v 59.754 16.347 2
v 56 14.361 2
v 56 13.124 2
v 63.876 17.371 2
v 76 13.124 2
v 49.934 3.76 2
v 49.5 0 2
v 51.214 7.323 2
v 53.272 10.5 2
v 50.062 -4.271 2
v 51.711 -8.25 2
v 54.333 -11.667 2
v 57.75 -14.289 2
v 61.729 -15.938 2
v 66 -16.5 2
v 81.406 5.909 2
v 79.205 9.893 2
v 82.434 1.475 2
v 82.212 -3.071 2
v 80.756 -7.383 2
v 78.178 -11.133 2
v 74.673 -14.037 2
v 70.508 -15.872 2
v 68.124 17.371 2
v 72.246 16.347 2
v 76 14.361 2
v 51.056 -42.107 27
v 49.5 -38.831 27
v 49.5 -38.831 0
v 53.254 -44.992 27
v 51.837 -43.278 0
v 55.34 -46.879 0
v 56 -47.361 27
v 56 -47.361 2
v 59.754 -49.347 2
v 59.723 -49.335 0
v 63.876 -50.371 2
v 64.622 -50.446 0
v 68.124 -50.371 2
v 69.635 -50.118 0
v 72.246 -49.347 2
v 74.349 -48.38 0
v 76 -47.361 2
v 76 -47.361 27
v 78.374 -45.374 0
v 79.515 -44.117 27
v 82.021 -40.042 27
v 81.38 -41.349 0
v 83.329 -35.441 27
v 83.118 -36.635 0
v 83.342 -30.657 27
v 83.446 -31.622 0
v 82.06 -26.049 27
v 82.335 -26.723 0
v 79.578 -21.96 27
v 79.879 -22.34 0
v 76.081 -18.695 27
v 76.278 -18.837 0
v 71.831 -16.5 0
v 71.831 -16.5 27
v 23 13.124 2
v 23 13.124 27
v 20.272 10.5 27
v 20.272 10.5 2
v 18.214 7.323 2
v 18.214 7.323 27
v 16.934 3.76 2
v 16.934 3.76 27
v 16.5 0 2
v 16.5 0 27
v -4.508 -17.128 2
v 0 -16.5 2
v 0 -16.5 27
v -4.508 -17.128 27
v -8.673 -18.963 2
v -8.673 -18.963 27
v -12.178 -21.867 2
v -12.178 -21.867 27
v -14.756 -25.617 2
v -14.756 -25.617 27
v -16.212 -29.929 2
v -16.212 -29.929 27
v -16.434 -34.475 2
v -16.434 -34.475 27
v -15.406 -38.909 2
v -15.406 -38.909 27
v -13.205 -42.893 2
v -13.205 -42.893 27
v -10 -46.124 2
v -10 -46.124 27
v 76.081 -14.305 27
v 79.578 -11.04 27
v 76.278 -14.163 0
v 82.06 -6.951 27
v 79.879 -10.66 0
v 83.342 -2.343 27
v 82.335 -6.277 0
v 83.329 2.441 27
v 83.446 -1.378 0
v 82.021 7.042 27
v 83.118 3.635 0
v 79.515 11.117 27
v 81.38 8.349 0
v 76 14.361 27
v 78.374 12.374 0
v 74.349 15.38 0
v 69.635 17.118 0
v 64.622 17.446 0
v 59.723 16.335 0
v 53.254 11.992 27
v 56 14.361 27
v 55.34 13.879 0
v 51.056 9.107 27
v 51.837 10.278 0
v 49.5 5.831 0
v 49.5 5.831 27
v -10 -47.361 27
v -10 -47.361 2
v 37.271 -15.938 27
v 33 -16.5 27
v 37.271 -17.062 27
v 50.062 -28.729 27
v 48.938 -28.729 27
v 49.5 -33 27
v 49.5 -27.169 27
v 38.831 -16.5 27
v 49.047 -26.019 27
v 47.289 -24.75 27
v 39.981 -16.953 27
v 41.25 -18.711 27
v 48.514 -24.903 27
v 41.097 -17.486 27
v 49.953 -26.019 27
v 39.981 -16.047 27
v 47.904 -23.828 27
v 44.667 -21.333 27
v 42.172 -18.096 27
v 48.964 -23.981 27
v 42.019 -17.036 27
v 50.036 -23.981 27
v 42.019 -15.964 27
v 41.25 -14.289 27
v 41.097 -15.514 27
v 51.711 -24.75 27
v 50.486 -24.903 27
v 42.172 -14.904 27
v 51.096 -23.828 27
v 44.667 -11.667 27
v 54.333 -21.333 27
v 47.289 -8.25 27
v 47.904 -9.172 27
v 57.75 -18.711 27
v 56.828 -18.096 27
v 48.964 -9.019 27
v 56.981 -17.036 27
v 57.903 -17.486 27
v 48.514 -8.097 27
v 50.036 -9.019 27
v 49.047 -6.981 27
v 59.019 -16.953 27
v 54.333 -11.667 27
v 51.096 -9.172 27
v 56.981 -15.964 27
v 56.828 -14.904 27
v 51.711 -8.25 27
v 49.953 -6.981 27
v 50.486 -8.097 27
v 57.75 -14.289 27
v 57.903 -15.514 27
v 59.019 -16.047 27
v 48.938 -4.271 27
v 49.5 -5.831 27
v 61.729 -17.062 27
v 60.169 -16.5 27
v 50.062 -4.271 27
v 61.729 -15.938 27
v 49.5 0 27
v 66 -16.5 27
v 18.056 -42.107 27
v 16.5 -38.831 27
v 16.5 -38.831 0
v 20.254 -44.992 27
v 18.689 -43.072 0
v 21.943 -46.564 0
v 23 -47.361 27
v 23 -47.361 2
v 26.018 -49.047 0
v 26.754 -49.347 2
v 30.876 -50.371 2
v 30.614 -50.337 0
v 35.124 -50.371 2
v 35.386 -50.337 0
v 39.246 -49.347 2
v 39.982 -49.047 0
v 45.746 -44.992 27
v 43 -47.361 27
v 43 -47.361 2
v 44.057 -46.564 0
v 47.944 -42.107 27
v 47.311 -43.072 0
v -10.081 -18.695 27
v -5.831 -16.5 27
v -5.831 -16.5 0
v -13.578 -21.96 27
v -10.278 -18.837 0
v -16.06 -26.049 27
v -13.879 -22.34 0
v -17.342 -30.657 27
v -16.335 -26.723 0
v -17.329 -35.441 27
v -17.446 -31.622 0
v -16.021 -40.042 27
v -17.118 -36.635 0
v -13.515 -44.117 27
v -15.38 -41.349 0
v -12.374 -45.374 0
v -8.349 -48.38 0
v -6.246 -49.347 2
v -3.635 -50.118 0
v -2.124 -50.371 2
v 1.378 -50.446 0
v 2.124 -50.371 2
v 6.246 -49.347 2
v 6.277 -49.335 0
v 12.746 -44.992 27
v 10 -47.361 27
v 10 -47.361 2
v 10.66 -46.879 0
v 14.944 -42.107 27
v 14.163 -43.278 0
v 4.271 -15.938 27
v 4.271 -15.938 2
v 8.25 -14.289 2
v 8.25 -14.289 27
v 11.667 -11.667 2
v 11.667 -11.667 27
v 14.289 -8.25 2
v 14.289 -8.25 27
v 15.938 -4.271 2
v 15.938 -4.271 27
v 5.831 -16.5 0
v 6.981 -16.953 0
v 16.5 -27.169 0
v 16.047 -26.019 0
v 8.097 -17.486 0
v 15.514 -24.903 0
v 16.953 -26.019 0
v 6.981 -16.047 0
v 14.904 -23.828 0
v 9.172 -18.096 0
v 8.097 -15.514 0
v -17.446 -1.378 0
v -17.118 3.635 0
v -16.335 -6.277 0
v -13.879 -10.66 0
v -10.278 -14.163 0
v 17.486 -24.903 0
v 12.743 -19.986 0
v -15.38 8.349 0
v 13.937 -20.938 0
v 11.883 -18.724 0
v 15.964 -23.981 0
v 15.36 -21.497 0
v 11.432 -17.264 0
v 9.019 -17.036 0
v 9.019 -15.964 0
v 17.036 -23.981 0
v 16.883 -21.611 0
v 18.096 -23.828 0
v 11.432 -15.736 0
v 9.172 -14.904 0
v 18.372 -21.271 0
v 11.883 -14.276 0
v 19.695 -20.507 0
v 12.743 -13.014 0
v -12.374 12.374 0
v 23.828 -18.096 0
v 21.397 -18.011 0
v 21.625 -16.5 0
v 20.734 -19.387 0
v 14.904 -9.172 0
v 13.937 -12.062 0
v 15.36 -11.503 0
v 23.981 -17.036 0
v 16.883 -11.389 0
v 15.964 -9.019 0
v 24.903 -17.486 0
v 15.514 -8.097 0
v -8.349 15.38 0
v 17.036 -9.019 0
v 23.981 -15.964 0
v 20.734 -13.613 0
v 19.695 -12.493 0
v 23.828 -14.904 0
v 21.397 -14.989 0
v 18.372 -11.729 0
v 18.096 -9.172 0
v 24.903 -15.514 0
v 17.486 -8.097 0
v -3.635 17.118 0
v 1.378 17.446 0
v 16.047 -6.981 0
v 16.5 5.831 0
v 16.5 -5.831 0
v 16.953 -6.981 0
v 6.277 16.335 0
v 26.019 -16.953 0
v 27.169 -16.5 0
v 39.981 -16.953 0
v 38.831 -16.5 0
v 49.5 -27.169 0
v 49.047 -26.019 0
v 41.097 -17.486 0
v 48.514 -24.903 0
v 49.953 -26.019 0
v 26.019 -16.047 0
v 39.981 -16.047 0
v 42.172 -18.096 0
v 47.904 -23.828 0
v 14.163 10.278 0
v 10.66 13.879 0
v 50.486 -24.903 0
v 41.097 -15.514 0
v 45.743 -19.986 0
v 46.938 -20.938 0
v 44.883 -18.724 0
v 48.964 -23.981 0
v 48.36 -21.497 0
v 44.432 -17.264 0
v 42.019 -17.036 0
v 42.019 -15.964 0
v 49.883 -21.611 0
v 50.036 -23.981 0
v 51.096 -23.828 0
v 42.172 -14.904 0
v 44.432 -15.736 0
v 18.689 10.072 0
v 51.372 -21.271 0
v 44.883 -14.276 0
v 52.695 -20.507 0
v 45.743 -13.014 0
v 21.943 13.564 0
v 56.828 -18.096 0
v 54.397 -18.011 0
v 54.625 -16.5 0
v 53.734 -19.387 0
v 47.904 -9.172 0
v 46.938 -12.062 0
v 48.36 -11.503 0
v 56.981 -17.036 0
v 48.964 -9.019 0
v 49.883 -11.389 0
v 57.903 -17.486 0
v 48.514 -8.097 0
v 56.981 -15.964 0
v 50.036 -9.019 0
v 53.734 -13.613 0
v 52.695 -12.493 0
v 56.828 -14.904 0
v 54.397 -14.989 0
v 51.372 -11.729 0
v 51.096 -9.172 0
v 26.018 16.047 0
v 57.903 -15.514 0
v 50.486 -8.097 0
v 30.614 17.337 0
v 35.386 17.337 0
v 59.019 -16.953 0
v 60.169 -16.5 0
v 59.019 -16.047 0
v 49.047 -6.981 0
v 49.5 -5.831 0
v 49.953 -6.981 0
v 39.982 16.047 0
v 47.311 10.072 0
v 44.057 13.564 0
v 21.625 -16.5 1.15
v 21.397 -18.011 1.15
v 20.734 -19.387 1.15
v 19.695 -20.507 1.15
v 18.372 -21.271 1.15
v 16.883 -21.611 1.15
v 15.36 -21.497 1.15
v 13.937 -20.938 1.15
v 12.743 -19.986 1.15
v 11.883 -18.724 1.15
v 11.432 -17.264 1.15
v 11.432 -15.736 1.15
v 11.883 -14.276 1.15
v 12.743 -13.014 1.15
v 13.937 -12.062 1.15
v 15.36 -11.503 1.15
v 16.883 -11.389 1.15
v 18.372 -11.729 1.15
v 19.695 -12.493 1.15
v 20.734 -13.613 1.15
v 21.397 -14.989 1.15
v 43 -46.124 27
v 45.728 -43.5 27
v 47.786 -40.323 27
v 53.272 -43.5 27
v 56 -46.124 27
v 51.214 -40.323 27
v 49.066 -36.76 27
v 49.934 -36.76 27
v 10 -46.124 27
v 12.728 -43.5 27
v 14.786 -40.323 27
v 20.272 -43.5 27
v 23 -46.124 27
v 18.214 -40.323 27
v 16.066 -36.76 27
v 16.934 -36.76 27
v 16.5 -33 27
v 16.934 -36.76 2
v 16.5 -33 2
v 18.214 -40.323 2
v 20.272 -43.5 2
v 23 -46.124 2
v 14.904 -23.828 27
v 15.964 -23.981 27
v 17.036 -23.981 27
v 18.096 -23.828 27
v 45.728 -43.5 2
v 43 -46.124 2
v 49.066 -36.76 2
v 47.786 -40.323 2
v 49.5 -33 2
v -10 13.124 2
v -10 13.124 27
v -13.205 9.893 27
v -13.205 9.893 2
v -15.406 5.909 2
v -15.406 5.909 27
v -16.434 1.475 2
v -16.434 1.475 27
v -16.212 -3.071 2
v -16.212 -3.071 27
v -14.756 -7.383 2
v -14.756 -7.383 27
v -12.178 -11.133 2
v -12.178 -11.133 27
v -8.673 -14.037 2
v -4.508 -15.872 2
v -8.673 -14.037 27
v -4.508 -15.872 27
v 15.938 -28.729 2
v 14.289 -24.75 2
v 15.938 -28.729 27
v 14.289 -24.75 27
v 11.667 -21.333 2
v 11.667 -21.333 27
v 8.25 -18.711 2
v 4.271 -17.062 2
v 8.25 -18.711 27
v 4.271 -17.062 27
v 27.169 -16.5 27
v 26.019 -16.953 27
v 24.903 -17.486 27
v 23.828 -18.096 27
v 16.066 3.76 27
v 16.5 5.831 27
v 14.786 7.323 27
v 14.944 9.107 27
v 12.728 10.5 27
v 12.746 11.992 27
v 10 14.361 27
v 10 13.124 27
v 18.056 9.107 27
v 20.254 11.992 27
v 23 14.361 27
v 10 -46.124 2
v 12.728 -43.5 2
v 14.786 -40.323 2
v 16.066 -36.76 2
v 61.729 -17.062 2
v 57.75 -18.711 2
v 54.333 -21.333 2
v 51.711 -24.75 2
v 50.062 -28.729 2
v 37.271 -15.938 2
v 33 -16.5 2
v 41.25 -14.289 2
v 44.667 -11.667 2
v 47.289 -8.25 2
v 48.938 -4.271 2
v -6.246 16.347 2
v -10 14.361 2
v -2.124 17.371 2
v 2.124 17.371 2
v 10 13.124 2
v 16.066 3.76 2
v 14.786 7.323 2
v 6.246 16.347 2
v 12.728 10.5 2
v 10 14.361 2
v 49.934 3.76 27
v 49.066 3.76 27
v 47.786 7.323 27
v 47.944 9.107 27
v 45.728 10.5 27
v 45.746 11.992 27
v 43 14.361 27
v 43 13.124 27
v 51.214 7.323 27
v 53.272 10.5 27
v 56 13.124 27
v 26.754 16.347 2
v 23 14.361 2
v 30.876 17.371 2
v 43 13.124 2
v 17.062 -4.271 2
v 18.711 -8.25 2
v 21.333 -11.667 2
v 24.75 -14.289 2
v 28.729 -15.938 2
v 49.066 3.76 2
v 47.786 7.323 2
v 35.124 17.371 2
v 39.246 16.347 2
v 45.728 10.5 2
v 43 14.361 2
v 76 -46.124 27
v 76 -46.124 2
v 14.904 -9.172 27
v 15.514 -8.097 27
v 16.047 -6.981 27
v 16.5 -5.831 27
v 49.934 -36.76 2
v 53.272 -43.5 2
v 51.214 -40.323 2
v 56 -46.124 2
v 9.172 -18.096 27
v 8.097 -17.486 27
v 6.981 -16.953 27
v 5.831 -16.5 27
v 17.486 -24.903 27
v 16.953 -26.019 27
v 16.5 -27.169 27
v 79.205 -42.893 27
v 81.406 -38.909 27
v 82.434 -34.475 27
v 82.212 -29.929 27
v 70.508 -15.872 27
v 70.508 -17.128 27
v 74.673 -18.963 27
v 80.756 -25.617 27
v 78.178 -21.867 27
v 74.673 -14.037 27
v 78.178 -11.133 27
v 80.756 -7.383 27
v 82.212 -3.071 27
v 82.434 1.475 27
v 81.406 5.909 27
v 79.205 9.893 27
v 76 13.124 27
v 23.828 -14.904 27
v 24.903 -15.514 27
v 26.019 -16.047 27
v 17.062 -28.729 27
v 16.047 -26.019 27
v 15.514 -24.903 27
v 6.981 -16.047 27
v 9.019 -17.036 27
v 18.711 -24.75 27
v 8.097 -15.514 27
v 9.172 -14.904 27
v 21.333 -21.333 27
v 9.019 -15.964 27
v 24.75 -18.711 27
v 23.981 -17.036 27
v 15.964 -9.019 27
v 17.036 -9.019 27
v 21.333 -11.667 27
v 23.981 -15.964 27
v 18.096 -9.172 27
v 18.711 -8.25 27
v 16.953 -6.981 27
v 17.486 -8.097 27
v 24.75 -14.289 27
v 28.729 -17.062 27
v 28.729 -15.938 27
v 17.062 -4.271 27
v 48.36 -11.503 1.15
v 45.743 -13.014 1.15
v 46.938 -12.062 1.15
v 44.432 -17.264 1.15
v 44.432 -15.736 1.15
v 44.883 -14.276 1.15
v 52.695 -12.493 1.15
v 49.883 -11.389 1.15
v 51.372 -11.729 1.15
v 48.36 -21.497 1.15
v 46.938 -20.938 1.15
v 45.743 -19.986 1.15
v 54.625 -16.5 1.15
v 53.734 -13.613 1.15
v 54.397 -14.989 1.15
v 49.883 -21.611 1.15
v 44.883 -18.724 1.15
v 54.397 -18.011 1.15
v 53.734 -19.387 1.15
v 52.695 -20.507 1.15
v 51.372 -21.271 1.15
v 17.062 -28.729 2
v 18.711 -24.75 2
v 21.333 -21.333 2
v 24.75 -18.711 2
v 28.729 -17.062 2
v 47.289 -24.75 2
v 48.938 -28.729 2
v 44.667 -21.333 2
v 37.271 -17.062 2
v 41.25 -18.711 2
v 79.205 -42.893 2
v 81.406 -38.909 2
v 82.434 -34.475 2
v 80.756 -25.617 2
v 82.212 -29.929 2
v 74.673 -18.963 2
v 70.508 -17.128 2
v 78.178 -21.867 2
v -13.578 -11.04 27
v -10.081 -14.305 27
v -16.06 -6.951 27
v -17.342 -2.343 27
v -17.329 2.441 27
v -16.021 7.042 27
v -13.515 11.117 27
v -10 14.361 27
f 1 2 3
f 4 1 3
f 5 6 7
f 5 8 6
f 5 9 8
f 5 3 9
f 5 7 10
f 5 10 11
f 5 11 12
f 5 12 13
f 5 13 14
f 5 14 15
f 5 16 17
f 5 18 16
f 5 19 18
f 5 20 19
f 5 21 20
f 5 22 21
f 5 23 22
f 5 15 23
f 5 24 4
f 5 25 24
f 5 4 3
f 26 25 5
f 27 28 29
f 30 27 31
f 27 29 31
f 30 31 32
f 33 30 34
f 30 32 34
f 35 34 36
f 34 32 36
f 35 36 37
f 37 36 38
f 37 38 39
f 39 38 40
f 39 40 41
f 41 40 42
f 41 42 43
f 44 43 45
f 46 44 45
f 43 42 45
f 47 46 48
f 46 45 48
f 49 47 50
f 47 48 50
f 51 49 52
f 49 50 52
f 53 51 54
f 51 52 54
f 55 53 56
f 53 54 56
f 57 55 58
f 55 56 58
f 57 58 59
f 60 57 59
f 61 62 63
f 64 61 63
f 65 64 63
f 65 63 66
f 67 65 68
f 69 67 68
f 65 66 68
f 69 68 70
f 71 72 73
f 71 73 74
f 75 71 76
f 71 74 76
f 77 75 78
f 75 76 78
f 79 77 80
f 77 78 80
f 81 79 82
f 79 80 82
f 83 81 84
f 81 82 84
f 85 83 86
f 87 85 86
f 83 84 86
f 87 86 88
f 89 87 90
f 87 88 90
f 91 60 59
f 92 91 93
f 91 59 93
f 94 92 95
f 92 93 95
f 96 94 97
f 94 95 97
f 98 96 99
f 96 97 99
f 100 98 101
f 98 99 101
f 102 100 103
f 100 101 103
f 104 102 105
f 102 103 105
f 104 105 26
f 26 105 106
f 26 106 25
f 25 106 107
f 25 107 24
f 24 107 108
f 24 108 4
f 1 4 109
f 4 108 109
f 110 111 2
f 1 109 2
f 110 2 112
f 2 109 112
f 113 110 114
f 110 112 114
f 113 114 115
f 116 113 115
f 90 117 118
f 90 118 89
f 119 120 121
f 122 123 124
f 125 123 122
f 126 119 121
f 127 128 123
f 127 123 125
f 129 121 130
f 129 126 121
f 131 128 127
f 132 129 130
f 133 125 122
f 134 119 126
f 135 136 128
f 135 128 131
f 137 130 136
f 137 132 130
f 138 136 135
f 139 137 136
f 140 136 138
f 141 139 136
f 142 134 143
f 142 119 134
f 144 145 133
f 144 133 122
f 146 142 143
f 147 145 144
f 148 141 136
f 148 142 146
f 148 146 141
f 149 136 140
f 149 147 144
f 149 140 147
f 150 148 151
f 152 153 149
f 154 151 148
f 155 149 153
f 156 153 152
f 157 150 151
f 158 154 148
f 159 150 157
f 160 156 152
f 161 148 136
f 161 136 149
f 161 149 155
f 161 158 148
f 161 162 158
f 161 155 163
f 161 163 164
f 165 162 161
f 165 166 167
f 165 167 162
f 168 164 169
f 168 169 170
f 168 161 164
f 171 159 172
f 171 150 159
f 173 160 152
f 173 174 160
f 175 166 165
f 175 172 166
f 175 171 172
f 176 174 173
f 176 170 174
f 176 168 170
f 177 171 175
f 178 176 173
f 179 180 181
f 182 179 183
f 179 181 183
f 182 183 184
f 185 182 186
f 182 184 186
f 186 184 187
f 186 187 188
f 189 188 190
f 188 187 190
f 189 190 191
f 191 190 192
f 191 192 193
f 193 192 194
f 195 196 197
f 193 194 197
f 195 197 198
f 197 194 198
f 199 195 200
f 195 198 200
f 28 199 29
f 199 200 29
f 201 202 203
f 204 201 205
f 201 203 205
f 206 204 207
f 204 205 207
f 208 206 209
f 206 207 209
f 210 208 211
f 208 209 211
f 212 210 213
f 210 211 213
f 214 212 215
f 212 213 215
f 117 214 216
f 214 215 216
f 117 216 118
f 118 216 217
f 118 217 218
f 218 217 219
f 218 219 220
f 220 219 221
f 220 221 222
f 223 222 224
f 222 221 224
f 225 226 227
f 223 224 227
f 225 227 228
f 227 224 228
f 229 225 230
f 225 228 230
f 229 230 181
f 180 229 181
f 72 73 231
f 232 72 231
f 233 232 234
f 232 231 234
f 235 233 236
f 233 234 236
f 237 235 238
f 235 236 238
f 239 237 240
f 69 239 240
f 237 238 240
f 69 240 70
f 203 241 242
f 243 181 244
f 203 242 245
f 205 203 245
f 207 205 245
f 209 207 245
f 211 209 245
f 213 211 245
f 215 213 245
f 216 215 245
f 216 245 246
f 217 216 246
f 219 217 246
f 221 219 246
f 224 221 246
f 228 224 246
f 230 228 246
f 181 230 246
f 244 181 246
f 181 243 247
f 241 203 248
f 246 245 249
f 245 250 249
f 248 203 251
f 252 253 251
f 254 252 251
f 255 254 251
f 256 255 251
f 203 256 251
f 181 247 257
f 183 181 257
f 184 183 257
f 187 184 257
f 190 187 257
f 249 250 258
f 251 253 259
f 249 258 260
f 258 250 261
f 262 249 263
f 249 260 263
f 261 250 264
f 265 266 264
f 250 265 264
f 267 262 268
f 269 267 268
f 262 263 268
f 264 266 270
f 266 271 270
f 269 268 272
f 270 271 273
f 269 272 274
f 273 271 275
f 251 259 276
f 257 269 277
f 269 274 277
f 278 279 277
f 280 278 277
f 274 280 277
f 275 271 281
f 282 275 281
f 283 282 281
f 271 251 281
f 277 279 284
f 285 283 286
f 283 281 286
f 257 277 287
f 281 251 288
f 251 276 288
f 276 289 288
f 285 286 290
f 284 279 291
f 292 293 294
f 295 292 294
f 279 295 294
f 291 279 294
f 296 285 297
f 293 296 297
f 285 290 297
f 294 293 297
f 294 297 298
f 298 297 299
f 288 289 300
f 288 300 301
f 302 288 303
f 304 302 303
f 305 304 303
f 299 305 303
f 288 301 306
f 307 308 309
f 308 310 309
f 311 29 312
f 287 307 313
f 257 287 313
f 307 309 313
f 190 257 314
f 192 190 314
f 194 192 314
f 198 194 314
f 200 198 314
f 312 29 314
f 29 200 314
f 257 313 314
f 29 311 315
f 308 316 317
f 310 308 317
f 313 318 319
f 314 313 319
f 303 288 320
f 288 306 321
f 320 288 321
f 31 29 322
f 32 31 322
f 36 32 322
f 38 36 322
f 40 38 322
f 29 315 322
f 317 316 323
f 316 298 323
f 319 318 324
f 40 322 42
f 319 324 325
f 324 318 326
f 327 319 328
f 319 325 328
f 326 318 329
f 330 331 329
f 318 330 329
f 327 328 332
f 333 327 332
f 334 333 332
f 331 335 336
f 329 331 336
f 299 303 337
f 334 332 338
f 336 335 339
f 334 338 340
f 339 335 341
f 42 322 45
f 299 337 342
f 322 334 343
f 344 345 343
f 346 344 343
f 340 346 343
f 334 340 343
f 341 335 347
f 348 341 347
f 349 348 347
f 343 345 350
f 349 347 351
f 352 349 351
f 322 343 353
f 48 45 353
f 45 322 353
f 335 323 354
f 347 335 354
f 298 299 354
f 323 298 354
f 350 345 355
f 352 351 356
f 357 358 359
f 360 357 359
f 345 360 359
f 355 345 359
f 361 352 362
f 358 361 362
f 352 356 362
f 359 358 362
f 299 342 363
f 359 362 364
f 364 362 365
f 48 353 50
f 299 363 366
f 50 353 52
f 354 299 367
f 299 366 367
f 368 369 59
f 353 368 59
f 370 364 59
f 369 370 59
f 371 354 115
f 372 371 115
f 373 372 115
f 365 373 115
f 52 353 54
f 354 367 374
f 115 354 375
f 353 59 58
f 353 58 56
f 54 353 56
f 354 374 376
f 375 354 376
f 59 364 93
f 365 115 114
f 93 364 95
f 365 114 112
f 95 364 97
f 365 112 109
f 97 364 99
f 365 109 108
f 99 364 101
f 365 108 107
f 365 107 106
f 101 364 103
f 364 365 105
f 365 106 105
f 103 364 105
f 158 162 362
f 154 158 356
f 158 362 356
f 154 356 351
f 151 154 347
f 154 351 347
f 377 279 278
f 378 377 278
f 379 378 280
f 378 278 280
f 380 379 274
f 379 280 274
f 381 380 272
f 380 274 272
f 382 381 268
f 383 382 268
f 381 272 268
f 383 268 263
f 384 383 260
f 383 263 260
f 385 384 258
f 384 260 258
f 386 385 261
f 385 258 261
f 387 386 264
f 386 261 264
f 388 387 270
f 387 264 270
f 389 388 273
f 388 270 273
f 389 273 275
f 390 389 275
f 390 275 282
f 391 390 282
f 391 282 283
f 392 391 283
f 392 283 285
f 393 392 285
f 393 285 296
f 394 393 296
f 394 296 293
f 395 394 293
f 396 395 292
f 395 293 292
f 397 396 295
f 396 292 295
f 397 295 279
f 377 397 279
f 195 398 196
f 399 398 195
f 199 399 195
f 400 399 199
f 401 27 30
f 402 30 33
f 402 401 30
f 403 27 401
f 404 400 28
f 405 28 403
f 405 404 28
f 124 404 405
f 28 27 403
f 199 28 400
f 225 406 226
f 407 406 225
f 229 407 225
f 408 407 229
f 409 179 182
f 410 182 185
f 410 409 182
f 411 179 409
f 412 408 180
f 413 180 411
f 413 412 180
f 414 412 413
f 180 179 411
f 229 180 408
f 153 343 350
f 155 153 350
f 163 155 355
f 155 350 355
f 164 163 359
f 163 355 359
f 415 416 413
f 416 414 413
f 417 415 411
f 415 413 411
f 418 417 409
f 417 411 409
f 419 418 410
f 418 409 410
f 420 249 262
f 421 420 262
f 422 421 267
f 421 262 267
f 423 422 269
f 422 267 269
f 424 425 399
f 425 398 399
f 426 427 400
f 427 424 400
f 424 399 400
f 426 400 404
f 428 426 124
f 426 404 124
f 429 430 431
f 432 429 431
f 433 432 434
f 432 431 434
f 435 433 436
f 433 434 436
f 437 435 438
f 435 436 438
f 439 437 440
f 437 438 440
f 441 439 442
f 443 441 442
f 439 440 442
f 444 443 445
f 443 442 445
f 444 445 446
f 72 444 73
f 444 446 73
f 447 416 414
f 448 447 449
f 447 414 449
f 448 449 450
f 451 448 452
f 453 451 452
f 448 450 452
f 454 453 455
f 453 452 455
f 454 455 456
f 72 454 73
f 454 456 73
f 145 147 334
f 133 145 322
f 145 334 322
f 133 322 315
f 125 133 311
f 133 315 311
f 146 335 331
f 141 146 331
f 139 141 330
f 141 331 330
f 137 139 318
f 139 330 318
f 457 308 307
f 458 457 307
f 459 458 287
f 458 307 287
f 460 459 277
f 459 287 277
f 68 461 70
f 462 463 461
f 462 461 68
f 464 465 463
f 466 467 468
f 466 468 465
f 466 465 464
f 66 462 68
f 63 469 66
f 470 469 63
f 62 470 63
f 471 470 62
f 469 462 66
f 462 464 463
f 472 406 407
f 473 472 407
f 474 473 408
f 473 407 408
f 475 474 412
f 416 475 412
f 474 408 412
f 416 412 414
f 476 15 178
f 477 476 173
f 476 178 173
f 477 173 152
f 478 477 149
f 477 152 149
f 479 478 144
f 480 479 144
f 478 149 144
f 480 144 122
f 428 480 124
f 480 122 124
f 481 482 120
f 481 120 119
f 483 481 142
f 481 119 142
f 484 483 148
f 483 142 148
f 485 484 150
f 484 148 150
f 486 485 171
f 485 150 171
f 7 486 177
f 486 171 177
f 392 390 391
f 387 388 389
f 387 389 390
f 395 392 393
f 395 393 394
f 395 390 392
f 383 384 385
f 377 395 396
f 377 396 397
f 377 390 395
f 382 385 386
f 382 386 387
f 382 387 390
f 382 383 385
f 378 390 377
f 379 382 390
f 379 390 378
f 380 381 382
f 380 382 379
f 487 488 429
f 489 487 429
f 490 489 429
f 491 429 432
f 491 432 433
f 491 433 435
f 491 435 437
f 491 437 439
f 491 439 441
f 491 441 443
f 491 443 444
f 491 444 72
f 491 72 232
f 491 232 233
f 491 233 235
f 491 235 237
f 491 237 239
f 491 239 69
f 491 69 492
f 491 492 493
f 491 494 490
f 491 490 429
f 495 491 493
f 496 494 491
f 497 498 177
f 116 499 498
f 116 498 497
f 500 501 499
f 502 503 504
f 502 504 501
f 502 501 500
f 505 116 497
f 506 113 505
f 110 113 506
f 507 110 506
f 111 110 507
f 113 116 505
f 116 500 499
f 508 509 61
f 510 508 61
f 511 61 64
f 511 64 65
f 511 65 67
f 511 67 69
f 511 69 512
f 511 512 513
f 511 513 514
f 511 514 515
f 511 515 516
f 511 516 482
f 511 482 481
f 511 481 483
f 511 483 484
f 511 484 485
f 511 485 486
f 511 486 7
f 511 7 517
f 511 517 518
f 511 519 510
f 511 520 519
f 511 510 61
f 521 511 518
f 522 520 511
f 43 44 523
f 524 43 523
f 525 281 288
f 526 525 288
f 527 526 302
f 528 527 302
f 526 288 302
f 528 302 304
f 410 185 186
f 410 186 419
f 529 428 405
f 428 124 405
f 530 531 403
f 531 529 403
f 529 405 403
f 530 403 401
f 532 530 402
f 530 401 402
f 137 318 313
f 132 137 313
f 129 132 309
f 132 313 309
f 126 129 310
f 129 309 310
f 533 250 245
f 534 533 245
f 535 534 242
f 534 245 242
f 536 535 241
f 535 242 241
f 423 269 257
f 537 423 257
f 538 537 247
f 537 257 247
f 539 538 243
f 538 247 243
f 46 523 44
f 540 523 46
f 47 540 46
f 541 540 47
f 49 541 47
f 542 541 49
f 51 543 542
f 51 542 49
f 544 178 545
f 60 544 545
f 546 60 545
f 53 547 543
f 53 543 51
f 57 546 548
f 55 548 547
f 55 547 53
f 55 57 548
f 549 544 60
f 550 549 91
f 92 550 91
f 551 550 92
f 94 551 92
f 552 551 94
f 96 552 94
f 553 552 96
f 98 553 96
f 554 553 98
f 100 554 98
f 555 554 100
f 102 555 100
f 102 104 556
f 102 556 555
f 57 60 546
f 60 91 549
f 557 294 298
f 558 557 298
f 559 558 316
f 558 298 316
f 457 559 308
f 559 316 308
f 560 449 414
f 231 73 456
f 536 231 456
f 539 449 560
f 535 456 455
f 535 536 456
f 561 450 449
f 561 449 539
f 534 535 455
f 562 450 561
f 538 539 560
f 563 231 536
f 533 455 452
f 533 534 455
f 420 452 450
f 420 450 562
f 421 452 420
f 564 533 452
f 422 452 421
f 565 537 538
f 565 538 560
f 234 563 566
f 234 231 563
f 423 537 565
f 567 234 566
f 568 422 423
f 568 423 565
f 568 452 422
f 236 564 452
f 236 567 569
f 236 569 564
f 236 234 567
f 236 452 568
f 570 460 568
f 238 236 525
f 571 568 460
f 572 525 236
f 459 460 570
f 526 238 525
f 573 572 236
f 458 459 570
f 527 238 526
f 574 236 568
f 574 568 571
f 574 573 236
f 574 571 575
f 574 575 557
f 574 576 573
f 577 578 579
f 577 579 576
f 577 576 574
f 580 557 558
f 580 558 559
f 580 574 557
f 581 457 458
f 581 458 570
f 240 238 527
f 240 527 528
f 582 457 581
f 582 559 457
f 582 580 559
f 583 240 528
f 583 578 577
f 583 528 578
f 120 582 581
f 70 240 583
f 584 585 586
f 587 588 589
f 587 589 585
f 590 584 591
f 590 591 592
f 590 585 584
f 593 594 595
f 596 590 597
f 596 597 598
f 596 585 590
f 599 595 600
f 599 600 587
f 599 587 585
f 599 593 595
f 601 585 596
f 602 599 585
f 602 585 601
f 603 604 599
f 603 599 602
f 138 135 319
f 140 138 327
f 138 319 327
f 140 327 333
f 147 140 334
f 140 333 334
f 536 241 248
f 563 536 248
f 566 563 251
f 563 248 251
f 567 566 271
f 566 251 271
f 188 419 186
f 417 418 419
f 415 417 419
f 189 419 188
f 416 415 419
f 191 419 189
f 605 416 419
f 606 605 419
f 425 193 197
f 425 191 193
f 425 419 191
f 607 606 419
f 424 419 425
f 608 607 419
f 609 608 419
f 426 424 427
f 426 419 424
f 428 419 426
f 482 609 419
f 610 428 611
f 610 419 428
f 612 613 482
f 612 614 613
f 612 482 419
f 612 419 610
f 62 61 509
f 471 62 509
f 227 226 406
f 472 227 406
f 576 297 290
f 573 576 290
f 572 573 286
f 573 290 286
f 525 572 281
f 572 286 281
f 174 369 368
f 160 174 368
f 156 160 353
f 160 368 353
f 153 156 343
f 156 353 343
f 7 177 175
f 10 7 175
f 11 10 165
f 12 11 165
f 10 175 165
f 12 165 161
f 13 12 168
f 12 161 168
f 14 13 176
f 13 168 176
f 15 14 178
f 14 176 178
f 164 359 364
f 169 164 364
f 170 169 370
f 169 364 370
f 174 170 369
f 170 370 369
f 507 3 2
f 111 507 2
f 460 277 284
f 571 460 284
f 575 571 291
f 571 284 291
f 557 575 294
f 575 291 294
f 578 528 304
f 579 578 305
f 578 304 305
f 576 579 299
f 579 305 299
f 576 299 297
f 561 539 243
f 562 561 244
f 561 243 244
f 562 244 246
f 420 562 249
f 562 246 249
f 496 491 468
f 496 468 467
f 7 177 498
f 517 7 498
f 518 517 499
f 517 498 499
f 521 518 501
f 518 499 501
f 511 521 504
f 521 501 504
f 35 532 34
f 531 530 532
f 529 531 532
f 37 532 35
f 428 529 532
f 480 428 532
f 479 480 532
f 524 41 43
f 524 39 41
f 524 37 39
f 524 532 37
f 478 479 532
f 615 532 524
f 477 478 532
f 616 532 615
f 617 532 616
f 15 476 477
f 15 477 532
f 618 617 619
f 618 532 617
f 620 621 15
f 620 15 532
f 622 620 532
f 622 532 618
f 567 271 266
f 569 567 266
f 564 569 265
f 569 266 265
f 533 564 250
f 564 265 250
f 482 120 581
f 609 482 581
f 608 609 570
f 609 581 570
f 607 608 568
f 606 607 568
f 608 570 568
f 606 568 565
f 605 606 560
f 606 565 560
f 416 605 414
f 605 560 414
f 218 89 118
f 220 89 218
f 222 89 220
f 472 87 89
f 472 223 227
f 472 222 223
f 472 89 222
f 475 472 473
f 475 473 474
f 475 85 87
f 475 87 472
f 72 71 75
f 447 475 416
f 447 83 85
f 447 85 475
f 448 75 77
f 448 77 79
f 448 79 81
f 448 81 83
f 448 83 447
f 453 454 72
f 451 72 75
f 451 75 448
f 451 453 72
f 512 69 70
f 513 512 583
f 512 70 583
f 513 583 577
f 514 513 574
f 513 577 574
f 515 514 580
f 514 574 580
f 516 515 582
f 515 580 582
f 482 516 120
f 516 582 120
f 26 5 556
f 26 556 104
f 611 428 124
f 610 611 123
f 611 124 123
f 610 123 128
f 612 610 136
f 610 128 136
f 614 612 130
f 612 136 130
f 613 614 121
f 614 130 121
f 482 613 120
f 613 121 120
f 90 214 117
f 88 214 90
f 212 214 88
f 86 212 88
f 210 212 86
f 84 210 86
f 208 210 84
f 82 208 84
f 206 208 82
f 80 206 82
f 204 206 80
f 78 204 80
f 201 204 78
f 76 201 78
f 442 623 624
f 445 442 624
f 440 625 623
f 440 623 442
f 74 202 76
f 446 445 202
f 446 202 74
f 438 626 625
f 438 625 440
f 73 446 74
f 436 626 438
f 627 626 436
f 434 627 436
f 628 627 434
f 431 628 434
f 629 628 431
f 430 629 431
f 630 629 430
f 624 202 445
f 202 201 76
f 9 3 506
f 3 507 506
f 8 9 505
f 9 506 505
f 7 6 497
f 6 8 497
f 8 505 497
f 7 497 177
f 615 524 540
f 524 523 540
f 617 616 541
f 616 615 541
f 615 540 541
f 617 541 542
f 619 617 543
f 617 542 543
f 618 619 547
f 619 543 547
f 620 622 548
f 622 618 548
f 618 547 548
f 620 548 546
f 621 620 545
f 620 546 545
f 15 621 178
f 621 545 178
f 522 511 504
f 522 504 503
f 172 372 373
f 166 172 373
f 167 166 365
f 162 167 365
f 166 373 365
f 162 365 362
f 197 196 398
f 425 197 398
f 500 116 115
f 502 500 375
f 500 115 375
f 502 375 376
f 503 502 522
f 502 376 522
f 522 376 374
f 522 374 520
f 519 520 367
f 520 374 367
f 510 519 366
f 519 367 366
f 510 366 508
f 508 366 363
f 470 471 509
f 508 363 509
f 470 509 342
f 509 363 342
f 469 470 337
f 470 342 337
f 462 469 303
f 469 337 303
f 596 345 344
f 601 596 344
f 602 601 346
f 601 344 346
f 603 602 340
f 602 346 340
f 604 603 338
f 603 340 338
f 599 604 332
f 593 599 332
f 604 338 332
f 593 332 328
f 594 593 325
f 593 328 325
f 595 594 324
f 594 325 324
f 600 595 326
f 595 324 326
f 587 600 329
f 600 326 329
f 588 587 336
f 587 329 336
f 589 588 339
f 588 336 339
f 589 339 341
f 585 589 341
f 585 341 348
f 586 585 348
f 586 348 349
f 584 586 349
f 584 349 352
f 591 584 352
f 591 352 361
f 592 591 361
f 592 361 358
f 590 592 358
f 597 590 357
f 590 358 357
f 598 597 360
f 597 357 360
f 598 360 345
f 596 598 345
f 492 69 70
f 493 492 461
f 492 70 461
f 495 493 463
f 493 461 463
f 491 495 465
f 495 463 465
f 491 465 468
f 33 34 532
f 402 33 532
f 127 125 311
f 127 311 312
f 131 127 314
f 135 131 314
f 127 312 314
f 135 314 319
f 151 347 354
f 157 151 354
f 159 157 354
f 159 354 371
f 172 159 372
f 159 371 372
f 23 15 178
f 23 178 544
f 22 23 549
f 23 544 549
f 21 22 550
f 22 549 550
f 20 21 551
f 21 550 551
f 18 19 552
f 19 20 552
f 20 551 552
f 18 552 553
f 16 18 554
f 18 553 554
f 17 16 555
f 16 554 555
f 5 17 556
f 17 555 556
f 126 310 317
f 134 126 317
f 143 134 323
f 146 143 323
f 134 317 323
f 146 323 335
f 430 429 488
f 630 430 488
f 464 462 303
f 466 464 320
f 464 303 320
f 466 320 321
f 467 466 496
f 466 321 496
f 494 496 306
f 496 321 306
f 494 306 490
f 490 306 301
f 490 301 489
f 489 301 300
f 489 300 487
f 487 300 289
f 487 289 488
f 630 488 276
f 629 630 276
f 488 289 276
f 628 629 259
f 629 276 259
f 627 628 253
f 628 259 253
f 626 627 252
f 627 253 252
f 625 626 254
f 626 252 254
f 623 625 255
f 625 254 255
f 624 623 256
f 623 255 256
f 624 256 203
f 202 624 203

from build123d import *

# Parameters (mm, degrees)
PAD_DEPTH       = 27
SKETCH001_R     = 16.5
POCKET_DEPTH    = 25
SKETCH002_R     = 16.5
POCKET001_DEPTH = 25
SKETCH003_R     = 16.5
POCKET002_DEPTH = 25
SKETCH004_R     = 16.5
POCKET003_DEPTH = 25
SKETCH005_R     = 16.5
POCKET004_DEPTH = 25
SKETCH006_R     = 16.5
POCKET005_DEPTH = 25
SKETCH007_R     = 5.125
POCKET006_DEPTH = 1.15
SKETCH008_R     = 5.125
POCKET007_DEPTH = 1.15
SKETCH009_W     = 20
SKETCH009_H     = 20
POCKET008_DEPTH = 25


with BuildPart() as part:
    # Sketch → Pad (new body)
    with BuildSketch(Plane.XY):
        with BuildLine():
            ThreePointArc((71.830952, -16.5), (78.374369, 12.374369), (49.5, 5.830952))
            ThreePointArc((49.5, 5.830952), (33, 17.5), (16.5, 5.830952))
            ThreePointArc((16.5, 5.830952), (-12.374369, 12.374369), (-5.830952, -16.5))
            ThreePointArc((-5.830952, -16.5), (-12.374369, -45.374369), (16.5, -38.830952))
            ThreePointArc((16.5, -38.830952), (33, -50.5), (49.5, -38.830952))
            ThreePointArc((49.5, -38.830952), (78.374369, -45.374369), (71.830952, -16.5))
        make_face()
        with BuildLine():
            ThreePointArc((5.830952, -16.5), (7.543698, -15.790586), (9.171788, -14.903969))
            ThreePointArc((9.171788, -14.903969), (9, -16.5), (9.171788, -18.096031))
            ThreePointArc((9.171788, -18.096031), (7.543698, -17.209414), (5.830952, -16.5))
        make_face(mode=Mode.SUBTRACT)
        with BuildLine():
            ThreePointArc((47.903969, -9.171788), (48.790586, -7.543698), (49.5, -5.830952))
            ThreePointArc((49.5, -5.830952), (50.209414, -7.543698), (51.096031, -9.171788))
            ThreePointArc((51.096031, -9.171788), (49.5, -9), (47.903969, -9.171788))
        make_face(mode=Mode.SUBTRACT)
        with BuildLine():
            ThreePointArc((18.096031, -23.828212), (17.209414, -25.456302), (16.5, -27.169048))
            ThreePointArc((16.5, -27.169048), (15.790586, -25.456302), (14.903969, -23.828212))
            ThreePointArc((14.903969, -23.828212), (16.5, -24), (18.096031, -23.828212))
        make_face(mode=Mode.SUBTRACT)
        with BuildLine():
            ThreePointArc((47.903969, -23.828212), (49.5, -24), (51.096031, -23.828212))
            ThreePointArc((51.096031, -23.828212), (50.209414, -25.456302), (49.5, -27.169048))
            ThreePointArc((49.5, -27.169048), (48.790586, -25.456302), (47.903969, -23.828212))
        make_face(mode=Mode.SUBTRACT)
        with BuildLine():
            ThreePointArc((14.903969, -9.171788), (15.790586, -7.543698), (16.5, -5.830952))
            ThreePointArc((16.5, -5.830952), (17.209414, -7.543698), (18.096031, -9.171788))
            ThreePointArc((18.096031, -9.171788), (16.5, -9), (14.903969, -9.171788))
        make_face(mode=Mode.SUBTRACT)
        with BuildLine():
            ThreePointArc((23.828212, -18.096031), (24, -16.5), (23.828212, -14.903969))
            ThreePointArc((23.828212, -14.903969), (25.456302, -15.790586), (27.169048, -16.5))
            ThreePointArc((27.169048, -16.5), (25.456302, -17.209414), (23.828212, -18.096031))
        make_face(mode=Mode.SUBTRACT)
        with BuildLine():
            ThreePointArc((42.171788, -18.096031), (40.543698, -17.209414), (38.830952, -16.5))
            ThreePointArc((38.830952, -16.5), (40.543698, -15.790586), (42.171788, -14.903969))
            ThreePointArc((42.171788, -14.903969), (42, -16.5), (42.171788, -18.096031))
        make_face(mode=Mode.SUBTRACT)
        with BuildLine():
            ThreePointArc((56.828212, -18.096031), (57, -16.5), (56.828212, -14.903969))
            ThreePointArc((56.828212, -14.903969), (58.456302, -15.790586), (60.169048, -16.5))
            ThreePointArc((60.169048, -16.5), (58.456302, -17.209414), (56.828212, -18.096031))
        make_face(mode=Mode.SUBTRACT)
    extrude(amount=PAD_DEPTH)

    # Sketch001 (on Face32 of Pad) → Pocket (cut)
    with BuildSketch(Plane.XY.offset(27)):
        Circle(SKETCH001_R)
    extrude(amount=-POCKET_DEPTH, mode=Mode.SUBTRACT)

    # Sketch002 (on Face5 of Pocket) → Pocket001 (cut)
    with BuildSketch(Plane.XY.offset(27)):
        with Locations((33, 0)):
            Circle(SKETCH002_R)
    extrude(amount=-POCKET001_DEPTH, mode=Mode.SUBTRACT)

    # Sketch003 (on Face5 of Pocket001) → Pocket002 (cut)
    with BuildSketch(Plane.XY.offset(27)):
        with Locations((66, 0)):
            Circle(SKETCH003_R)
    extrude(amount=-POCKET002_DEPTH, mode=Mode.SUBTRACT)

    # Sketch004 (on Face5 of Pocket002) → Pocket003 (cut)
    with BuildSketch(Plane.XY.offset(27)):
        with Locations((0, -33)):
            Circle(SKETCH004_R)
    extrude(amount=-POCKET003_DEPTH, mode=Mode.SUBTRACT)

    # Sketch005 (on Face5 of Pocket003) → Pocket004 (cut)
    with BuildSketch(Plane.XY.offset(27)):
        with Locations((33, -33)):
            Circle(SKETCH005_R)
    extrude(amount=-POCKET004_DEPTH, mode=Mode.SUBTRACT)

    # Sketch006 (on Face5 of Pocket004) → Pocket005 (cut)
    with BuildSketch(Plane.XY.offset(27)):
        with Locations((66, -33)):
            Circle(SKETCH006_R)
    extrude(amount=-POCKET005_DEPTH, mode=Mode.SUBTRACT)

    # Sketch007 (on Face4 of Pocket005) → Pocket006 (cut)
    with BuildSketch(Plane(origin=(0, 0, 0), x_dir=(1, 0, 0), z_dir=(0, 0, -1))):
        with Locations((16.5, 16.5)):
            Circle(SKETCH007_R)
    extrude(amount=-POCKET006_DEPTH, mode=Mode.SUBTRACT)

    # Sketch008 (on Face4 of Pocket006) → Pocket007 (cut)
    with BuildSketch(Plane(origin=(0, 0, 0), x_dir=(1, 0, 0), z_dir=(0, 0, -1))):
        with Locations((49.5, 16.5)):
            Circle(SKETCH008_R)
    extrude(amount=-POCKET007_DEPTH, mode=Mode.SUBTRACT)

    # Sketch009 (on Face43 of Pocket007) → Pocket008 (cut)
    with BuildSketch(Plane.XY.offset(27)):
        with Locations((0, 10)):
            Rectangle(SKETCH009_W, SKETCH009_H)
        with Locations((33, 10)):
            Rectangle(SKETCH009_W, SKETCH009_H)
        with Locations((66, 10)):
            Rectangle(SKETCH009_W, SKETCH009_H)
        with Locations((0, -45)):
            Rectangle(SKETCH009_W, SKETCH009_H)
        with Locations((33, -45)):
            Rectangle(SKETCH009_W, SKETCH009_H)
        with Locations((66, -45)):
            Rectangle(SKETCH009_W, SKETCH009_H)
    extrude(amount=-POCKET008_DEPTH, mode=Mode.SUBTRACT)


solid = part.part
